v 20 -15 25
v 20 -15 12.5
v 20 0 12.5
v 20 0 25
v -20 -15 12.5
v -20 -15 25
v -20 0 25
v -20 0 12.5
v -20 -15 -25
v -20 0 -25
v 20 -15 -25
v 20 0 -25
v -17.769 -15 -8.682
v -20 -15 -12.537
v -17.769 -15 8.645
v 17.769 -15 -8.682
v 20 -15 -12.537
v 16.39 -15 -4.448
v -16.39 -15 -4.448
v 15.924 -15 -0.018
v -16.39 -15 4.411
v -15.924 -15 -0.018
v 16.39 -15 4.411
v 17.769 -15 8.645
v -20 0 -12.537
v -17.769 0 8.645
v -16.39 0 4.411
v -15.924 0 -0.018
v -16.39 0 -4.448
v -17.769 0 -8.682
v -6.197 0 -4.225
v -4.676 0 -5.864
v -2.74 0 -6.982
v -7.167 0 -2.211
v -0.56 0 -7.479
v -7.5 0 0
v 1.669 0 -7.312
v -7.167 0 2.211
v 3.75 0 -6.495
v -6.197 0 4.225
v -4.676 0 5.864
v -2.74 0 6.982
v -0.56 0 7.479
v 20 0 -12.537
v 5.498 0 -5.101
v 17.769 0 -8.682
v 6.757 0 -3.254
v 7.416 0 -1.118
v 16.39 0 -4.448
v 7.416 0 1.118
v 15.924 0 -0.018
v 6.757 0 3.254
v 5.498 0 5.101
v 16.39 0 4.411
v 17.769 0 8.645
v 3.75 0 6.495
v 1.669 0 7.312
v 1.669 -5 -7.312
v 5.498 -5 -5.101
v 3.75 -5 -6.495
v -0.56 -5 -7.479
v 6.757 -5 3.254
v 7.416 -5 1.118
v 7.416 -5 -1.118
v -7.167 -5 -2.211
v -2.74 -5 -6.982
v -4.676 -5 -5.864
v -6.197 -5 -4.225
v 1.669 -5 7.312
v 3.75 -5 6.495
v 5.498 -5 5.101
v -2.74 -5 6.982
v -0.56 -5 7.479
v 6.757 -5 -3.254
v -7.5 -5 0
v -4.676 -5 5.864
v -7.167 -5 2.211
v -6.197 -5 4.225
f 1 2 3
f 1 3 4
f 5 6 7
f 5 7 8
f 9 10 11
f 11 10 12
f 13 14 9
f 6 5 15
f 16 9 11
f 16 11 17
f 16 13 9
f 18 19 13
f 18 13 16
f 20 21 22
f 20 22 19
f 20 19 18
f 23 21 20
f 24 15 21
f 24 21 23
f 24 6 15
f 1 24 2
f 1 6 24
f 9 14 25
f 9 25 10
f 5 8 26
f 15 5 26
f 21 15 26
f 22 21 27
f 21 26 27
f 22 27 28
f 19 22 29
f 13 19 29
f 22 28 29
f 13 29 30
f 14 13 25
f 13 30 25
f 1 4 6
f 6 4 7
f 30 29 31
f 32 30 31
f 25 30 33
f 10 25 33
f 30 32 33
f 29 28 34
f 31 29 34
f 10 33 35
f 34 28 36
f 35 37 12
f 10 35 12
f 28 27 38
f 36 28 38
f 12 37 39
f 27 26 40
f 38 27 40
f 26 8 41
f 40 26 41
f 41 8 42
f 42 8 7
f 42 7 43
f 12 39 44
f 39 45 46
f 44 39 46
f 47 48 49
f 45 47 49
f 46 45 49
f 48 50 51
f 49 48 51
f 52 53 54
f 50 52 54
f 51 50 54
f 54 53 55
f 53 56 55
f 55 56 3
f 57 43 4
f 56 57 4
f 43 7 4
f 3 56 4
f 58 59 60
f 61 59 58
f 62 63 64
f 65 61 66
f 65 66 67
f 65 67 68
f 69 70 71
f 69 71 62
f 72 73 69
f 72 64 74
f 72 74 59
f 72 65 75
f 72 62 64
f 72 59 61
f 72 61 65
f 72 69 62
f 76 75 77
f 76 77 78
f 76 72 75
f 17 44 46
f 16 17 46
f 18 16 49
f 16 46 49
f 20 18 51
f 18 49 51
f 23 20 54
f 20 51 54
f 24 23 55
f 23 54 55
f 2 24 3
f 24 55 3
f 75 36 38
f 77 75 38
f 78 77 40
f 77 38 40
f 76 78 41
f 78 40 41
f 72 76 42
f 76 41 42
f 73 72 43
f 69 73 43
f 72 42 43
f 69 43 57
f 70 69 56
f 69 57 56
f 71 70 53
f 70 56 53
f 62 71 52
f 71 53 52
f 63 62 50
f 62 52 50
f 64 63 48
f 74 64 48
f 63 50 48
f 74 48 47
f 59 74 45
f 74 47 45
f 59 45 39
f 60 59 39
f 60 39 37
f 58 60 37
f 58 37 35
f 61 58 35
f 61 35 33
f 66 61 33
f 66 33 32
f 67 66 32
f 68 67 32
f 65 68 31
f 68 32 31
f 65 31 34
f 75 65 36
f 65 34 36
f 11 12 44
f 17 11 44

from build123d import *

# Parameters (mm, degrees)
F1_DEPTH = 15
F2_R     = 7.5
F3_DEPTH = 5


with BuildPart() as f1:
    # F0 (on Front) → F1 (new body)
    with BuildSketch(Plane.XZ):
        with BuildLine():
            Line((-20, -25), (20, -25))
            Line((20, -25), (20, -12.536835))
            ThreePointArc((20, -12.536835), (15.923849, -0.018417), (20, 12.5))
            Line((20, 12.5), (20, 25))
            Line((20, 25), (-20, 25))
            Line((-20, 25), (-20, 12.5))
            ThreePointArc((-20, 12.5), (-15.923849, -0.018417), (-20, -12.536835))
            Line((-20, -12.536835), (-20, -25))
        make_face()
    extrude(amount=F1_DEPTH)

    # F2 (on face) → F3 (cut)
    with BuildSketch(Plane(origin=(0, 0, 0), x_dir=(-1, 0, 0), z_dir=(0, 1, 0))):
        Circle(F2_R)
    extrude(amount=-F3_DEPTH, mode=Mode.SUBTRACT)


solid = f1.part
